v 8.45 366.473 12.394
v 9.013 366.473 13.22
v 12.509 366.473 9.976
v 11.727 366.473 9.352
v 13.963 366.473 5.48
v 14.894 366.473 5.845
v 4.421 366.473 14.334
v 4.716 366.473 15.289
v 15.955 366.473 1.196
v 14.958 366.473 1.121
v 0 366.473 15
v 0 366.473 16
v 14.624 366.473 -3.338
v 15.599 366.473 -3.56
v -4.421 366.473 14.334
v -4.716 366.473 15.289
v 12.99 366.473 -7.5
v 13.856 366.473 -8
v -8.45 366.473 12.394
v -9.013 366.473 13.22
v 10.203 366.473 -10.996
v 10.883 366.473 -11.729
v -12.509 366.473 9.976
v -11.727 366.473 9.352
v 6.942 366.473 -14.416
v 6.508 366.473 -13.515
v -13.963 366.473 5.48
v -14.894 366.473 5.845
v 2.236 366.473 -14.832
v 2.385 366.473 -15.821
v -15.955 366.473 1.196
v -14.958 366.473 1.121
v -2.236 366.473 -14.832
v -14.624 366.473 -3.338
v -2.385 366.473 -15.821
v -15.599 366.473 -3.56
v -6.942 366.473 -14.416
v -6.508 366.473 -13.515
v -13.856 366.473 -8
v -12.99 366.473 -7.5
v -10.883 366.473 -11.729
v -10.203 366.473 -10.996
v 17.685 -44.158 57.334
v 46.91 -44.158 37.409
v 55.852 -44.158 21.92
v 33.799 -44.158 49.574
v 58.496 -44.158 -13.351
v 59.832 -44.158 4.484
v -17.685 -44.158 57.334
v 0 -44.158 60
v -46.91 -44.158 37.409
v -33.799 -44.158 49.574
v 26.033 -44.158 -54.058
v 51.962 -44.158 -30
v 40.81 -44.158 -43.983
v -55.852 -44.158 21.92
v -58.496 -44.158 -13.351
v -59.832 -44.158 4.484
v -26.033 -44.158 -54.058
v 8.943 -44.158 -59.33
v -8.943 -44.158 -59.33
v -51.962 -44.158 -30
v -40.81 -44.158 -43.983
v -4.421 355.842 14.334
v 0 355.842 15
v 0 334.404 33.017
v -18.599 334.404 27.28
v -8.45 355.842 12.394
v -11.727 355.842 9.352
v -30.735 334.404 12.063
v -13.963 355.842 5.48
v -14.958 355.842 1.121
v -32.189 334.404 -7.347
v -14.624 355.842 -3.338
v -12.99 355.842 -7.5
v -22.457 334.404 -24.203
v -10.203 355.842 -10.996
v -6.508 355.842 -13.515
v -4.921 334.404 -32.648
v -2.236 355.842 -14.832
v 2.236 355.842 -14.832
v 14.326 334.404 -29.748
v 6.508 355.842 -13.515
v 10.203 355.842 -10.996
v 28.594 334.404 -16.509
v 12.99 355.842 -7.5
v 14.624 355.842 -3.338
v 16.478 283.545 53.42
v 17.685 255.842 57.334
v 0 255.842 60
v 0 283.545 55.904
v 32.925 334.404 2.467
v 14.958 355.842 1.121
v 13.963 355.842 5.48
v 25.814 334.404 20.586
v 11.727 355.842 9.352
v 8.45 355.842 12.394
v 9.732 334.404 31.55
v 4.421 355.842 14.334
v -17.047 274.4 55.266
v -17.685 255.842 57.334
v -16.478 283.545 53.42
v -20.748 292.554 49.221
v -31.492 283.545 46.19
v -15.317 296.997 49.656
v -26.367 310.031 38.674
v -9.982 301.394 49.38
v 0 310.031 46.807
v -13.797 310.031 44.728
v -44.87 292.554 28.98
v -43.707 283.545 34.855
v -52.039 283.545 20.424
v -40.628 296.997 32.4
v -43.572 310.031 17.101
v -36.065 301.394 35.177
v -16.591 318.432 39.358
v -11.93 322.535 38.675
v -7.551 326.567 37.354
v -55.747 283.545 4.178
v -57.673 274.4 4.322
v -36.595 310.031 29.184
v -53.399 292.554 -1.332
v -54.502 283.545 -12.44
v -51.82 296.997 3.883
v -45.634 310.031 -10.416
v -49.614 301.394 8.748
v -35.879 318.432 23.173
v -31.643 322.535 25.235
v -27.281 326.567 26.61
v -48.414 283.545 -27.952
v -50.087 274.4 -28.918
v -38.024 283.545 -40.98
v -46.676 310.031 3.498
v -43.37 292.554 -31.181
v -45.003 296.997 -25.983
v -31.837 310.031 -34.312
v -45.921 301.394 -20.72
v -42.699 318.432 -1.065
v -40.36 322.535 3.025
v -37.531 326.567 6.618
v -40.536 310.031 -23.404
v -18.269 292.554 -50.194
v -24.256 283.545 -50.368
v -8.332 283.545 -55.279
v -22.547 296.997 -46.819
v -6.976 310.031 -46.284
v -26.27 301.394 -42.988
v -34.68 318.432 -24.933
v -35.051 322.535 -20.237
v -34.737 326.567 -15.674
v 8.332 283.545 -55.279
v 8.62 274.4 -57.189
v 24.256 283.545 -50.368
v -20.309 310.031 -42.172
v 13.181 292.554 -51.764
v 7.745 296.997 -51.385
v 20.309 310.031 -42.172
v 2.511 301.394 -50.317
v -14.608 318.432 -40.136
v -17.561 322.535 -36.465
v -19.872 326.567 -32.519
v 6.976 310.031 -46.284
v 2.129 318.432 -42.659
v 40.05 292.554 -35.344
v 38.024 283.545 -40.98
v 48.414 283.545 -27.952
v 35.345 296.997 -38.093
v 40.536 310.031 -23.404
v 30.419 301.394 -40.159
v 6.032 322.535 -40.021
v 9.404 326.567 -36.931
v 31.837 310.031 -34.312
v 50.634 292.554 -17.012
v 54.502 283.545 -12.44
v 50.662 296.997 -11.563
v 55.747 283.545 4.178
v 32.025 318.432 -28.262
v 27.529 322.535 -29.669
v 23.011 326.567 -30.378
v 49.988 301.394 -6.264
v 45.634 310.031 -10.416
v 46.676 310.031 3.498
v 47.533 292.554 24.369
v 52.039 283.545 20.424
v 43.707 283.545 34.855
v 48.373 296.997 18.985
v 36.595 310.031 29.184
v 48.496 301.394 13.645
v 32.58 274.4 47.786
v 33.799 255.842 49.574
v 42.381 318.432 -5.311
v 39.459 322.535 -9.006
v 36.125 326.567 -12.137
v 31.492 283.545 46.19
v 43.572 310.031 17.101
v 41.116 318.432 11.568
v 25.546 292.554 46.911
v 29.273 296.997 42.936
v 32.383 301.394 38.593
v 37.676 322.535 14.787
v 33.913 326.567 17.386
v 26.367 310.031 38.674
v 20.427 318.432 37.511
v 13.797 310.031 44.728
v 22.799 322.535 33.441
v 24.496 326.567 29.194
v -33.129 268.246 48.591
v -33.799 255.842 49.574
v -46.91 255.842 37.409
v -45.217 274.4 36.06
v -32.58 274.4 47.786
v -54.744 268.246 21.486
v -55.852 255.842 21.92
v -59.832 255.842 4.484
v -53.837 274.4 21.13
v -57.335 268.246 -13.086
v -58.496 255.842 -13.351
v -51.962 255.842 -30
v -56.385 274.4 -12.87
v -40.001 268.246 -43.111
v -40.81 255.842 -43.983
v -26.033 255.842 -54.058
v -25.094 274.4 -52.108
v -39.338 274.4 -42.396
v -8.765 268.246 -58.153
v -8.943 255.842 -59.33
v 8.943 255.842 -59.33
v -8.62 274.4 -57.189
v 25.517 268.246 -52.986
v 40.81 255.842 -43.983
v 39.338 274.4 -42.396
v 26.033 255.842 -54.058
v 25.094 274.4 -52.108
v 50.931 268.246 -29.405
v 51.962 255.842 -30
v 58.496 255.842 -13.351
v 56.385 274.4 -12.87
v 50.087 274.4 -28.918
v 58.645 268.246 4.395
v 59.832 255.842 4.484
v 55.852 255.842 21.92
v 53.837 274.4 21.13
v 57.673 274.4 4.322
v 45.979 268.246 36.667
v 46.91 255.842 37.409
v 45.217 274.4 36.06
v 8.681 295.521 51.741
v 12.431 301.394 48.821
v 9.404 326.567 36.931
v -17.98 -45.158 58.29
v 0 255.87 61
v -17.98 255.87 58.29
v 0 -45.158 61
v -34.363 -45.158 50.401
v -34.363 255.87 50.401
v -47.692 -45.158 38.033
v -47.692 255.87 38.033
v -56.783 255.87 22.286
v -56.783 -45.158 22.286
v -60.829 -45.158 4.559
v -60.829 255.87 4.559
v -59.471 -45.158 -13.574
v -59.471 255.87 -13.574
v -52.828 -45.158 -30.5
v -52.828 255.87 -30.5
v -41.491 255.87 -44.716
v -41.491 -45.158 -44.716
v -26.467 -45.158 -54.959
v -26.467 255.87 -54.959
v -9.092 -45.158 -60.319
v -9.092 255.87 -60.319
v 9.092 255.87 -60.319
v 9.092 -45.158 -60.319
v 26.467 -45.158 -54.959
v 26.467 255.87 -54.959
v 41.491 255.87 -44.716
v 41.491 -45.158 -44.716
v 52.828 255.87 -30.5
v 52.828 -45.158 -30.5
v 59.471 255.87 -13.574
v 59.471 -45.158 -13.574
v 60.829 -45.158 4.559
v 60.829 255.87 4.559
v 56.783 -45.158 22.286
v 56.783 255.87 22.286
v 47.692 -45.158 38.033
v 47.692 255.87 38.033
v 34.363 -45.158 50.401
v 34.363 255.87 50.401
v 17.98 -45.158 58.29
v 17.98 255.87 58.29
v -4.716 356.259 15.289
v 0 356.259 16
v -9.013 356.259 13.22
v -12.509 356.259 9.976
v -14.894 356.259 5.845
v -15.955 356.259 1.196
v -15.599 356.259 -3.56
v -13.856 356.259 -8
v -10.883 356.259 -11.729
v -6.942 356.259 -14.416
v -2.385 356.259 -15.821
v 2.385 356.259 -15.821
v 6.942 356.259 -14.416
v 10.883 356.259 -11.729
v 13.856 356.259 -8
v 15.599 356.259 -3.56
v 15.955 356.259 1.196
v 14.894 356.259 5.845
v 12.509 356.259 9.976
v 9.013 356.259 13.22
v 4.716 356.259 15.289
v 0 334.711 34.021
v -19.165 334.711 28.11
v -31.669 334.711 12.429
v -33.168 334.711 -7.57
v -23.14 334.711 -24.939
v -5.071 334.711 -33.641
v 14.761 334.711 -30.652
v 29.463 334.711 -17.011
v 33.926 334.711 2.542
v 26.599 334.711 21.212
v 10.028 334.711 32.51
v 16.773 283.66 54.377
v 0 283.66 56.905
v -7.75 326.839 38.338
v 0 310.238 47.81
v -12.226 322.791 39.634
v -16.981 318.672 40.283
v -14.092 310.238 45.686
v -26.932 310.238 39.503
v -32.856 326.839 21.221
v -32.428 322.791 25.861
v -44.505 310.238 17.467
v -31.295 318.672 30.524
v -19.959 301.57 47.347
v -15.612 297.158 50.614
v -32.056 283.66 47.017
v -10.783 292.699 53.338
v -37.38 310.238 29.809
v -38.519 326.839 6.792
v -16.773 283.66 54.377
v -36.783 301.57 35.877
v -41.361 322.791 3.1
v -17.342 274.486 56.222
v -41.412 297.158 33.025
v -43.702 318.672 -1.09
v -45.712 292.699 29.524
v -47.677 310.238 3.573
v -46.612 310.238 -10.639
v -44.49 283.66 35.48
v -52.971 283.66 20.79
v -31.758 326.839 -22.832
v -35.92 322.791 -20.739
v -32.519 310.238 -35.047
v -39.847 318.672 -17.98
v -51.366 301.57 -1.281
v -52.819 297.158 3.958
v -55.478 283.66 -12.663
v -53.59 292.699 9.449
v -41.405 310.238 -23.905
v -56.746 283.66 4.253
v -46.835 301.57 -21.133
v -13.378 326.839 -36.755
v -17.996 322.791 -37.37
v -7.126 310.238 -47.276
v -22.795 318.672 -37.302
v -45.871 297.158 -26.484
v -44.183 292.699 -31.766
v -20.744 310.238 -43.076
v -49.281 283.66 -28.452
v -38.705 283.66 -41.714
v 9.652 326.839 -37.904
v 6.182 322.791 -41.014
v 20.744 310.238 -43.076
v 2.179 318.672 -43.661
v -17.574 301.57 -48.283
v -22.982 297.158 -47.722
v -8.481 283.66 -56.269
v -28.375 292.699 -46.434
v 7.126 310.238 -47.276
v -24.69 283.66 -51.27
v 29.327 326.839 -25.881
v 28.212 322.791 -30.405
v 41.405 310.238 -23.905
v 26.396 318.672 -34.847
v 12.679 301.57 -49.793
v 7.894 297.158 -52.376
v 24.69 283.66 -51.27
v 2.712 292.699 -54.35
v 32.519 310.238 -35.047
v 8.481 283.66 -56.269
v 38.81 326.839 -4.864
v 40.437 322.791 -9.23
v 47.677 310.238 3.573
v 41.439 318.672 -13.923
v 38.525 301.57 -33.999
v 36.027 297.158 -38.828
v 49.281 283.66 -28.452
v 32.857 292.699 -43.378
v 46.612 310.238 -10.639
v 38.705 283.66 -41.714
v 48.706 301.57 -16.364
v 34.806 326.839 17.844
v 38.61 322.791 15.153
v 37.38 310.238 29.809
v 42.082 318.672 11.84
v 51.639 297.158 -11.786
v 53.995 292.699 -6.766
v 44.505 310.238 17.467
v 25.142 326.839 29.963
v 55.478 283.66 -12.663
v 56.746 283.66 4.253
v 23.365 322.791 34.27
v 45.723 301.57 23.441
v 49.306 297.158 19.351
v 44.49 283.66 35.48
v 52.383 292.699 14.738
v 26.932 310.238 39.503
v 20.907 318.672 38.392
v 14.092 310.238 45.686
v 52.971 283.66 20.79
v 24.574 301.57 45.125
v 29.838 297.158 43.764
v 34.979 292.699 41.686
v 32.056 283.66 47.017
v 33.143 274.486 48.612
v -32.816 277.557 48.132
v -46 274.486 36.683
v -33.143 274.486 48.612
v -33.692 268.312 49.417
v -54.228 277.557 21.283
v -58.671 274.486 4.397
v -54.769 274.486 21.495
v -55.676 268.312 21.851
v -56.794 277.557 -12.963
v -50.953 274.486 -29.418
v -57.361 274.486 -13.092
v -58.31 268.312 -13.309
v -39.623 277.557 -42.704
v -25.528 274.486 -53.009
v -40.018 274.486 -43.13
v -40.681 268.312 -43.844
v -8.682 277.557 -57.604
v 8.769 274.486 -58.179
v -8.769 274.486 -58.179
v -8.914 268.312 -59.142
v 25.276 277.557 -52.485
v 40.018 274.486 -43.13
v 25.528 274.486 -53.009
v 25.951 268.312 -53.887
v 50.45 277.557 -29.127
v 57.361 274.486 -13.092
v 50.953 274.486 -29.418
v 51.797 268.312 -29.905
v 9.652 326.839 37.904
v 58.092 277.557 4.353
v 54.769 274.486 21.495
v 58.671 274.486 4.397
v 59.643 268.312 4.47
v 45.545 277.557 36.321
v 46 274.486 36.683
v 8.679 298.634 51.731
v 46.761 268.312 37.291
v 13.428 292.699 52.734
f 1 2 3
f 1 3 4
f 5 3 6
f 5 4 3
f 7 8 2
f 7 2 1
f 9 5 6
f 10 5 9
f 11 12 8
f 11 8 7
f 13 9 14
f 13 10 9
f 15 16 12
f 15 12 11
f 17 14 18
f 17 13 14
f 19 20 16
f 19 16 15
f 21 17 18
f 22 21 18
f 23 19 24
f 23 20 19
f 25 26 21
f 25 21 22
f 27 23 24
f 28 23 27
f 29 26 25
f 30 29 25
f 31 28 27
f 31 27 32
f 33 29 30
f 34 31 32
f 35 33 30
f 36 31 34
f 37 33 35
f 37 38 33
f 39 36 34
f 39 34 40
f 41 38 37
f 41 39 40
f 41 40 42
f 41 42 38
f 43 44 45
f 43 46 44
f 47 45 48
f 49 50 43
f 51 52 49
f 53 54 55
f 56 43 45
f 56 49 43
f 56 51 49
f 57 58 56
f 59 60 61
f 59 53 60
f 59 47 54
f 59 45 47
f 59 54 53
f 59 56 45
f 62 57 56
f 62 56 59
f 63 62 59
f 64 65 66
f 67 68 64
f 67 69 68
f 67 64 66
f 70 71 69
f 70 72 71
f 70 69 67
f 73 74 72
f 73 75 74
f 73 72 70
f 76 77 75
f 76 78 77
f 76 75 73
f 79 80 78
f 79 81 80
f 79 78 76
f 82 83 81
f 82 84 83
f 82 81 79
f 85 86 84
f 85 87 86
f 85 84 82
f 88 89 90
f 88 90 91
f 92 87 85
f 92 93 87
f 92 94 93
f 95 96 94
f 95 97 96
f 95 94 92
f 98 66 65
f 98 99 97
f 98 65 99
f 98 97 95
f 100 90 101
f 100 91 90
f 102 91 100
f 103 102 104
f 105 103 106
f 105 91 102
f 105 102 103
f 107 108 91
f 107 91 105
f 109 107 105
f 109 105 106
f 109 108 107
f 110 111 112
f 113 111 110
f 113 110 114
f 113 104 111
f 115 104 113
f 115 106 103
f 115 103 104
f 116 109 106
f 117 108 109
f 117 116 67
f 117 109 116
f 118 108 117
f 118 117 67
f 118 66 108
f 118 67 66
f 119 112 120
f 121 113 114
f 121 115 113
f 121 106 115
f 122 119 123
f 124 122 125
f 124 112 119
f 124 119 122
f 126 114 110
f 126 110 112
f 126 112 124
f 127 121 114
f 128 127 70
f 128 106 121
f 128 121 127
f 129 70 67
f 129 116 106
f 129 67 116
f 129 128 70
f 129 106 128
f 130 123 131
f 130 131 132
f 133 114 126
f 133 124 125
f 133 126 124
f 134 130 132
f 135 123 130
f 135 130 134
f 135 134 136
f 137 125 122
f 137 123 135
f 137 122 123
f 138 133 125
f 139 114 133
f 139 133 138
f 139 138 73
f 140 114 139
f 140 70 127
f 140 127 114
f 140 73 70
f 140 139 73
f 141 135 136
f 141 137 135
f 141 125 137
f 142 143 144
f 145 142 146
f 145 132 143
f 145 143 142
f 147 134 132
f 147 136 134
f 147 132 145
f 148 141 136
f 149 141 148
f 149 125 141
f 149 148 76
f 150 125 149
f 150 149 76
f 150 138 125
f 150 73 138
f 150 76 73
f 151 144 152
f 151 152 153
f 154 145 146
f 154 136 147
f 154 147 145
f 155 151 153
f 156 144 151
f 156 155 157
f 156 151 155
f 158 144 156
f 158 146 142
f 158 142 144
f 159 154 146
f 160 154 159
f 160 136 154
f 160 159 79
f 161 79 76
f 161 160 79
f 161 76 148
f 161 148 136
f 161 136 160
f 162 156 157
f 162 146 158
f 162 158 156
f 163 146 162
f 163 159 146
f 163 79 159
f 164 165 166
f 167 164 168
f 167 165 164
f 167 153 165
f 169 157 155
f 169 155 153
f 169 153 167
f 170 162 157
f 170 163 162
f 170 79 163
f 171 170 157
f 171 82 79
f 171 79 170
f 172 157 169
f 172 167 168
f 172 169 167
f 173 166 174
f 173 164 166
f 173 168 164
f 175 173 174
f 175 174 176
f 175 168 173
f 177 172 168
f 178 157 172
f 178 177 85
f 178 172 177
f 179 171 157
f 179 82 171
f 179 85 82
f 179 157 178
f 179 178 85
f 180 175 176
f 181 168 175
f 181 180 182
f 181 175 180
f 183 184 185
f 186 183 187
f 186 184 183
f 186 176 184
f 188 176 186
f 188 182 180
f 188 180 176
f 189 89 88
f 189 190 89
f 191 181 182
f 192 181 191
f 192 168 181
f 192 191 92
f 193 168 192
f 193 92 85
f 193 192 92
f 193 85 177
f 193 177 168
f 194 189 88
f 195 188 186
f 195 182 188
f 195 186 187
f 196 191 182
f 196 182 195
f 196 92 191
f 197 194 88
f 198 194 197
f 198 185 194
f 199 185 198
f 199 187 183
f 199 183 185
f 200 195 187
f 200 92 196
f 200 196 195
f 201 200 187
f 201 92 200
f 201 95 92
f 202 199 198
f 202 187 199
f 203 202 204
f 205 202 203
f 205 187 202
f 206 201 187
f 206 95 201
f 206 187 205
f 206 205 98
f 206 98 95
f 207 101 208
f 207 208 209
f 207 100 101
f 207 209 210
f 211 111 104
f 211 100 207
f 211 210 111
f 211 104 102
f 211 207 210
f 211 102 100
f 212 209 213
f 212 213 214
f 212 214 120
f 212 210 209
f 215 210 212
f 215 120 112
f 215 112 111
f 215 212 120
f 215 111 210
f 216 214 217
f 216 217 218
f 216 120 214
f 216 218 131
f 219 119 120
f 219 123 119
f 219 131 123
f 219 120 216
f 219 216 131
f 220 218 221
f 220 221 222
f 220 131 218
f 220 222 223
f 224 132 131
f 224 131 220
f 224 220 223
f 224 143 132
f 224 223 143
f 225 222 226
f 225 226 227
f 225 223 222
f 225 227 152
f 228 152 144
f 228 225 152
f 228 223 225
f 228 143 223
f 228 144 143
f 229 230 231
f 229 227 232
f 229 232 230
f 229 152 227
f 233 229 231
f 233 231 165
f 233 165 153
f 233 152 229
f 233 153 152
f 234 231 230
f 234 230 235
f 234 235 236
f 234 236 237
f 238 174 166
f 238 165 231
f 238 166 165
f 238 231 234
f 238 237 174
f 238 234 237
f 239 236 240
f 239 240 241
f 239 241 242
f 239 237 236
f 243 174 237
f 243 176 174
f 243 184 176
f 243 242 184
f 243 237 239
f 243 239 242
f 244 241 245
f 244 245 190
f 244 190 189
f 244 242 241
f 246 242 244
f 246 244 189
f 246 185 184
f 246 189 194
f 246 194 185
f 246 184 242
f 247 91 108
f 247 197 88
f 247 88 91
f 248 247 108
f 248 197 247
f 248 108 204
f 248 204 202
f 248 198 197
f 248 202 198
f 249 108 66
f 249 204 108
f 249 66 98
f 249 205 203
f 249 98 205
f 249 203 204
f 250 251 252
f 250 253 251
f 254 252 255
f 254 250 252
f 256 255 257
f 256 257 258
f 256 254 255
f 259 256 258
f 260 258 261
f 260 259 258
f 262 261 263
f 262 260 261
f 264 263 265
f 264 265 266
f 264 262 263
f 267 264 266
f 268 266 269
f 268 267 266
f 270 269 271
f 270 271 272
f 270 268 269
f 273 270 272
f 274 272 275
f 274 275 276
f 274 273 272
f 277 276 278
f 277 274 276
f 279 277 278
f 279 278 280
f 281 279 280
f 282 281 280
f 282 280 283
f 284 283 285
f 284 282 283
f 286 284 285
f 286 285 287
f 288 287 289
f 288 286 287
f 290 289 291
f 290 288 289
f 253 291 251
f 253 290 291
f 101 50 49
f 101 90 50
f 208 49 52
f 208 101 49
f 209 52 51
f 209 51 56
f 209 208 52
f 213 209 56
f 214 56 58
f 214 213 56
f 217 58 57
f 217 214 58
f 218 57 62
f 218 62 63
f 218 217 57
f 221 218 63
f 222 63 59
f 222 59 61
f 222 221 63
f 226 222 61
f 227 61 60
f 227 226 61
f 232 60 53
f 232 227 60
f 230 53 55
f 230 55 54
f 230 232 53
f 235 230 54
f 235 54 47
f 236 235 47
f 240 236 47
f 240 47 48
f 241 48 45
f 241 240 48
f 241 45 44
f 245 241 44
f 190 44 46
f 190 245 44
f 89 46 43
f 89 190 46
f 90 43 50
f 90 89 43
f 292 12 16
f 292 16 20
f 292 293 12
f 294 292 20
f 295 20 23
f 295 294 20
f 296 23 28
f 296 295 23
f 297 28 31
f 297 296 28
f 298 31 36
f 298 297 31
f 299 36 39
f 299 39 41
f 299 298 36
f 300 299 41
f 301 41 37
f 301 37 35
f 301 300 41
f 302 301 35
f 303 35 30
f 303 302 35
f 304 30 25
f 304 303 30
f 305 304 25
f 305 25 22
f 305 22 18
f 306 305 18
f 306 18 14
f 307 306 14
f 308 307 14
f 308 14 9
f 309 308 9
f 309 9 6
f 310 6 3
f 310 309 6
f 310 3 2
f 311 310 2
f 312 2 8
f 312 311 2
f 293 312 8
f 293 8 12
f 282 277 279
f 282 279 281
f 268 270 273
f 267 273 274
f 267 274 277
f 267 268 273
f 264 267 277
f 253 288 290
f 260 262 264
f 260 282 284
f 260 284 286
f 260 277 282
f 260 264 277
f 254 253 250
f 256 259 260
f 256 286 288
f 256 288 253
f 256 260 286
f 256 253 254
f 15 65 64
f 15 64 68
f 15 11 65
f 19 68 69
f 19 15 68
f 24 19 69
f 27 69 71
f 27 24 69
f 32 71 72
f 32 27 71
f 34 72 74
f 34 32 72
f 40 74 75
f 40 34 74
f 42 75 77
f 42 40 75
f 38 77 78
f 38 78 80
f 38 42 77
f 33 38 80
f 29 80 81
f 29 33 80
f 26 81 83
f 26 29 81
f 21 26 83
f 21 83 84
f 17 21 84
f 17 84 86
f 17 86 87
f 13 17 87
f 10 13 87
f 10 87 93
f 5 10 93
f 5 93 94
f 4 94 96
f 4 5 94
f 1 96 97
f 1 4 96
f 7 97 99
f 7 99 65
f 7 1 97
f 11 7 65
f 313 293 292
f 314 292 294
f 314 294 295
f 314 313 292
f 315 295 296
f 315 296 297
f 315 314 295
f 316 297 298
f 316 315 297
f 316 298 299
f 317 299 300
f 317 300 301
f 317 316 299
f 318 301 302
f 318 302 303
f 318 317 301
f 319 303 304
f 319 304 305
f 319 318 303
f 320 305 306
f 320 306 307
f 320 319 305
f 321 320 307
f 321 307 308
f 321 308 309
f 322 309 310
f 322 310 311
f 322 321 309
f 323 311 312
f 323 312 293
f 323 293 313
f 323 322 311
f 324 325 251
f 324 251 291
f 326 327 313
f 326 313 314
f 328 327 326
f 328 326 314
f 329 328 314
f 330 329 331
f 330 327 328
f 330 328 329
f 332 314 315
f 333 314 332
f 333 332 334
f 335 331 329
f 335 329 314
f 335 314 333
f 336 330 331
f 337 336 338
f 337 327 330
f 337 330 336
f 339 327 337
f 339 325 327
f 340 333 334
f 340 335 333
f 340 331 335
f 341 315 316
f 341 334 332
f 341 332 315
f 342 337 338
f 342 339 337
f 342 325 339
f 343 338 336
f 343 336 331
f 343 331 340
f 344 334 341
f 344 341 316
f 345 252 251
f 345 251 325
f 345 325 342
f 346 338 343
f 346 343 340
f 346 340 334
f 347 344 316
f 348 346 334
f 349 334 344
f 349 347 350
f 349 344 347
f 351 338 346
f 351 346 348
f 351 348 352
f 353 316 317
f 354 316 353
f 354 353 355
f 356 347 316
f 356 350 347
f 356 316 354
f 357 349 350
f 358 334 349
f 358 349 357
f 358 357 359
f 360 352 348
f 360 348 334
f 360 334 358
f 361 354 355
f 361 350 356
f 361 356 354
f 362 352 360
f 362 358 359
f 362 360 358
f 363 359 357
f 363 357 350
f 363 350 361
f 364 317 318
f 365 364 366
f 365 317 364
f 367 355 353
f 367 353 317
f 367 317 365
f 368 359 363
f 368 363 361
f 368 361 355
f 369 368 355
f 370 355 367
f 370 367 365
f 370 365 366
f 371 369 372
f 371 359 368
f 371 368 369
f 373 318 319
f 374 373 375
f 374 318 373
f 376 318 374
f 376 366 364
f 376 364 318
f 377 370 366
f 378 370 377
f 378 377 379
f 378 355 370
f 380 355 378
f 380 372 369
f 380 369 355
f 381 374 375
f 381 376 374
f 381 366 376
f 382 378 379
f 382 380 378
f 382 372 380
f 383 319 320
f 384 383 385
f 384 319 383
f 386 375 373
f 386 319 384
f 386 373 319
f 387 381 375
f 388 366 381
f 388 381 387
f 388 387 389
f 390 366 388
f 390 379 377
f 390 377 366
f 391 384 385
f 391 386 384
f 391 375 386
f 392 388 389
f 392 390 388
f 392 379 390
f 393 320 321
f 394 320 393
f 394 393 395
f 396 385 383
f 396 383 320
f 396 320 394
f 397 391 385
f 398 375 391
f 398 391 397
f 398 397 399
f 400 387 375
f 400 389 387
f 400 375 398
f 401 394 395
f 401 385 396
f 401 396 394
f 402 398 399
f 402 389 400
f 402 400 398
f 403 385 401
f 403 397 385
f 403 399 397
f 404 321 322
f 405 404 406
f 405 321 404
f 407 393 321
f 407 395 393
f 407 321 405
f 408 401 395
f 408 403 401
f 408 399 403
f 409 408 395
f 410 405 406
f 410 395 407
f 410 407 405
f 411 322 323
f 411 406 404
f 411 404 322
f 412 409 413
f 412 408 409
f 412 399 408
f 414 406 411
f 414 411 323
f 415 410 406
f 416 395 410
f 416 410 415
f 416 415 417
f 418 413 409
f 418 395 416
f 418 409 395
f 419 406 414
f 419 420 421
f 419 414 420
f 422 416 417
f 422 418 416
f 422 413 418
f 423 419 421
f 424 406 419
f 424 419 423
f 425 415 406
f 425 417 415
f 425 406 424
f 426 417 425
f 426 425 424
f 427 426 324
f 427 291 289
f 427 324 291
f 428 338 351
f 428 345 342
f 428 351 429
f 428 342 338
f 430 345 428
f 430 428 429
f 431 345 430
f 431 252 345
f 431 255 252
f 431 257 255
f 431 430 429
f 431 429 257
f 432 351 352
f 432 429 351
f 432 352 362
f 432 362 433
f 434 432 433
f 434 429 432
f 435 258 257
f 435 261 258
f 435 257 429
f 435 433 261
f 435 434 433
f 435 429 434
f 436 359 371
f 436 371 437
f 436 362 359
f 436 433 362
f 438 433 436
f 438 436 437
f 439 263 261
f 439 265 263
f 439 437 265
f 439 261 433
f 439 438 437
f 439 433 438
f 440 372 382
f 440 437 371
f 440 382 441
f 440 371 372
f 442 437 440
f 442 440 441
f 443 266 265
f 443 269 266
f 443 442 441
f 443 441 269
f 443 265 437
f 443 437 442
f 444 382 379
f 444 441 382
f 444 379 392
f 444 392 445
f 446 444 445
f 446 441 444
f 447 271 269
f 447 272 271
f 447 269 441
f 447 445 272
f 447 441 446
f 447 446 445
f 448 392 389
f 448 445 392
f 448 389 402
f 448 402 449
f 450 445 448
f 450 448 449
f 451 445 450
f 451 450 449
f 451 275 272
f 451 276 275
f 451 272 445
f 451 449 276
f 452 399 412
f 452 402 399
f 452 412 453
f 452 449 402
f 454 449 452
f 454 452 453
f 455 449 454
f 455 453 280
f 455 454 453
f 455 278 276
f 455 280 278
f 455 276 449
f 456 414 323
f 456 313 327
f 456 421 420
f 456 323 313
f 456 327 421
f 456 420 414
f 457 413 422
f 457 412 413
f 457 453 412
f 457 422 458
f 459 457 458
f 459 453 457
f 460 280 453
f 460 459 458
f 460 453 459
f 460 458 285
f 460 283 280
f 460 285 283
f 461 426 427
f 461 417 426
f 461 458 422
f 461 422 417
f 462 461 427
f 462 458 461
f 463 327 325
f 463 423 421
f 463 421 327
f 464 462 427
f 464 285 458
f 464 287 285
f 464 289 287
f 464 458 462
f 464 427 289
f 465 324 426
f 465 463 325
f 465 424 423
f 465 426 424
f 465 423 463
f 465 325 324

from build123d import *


with BuildPart() as part:
    # Sketch8 → Revolve1 (revolve)
    with BuildSketch(Plane.XY, mode=Mode.PRIVATE) as revolve1_sk:
        with BuildLine():
            Line((0, -44.157655741), (-60, -44.157655741))
            Line((-60, -44.157655741), (-60, 255.842344259))
            ThreePointArc((-60, 255.842344259), (-46.807103103, 310.030540655), (-15, 355.842344259))
            Line((-15, 355.842344259), (-15, 365.473388744))
            Line((-15, 365.473388744), (-15, 366.473388744))
            Line((-15, 366.473388744), (-16, 366.473388744))
            Line((-16, 366.473388744), (-16, 356.258998247))
            ThreePointArc((-16, 356.258998247), (-47.810277996, 310.237725941), (-61, 255.869697429))
            Line((-61, 255.869697429), (-61, -45.157655741))
            Line((-61, -45.157655741), (0, -45.157655741))
            Line((0, -45.157655741), (0, -44.157655741))
        make_face()
    revolve(revolve1_sk.sketch.rotate(Axis((0, 434.739798995, 0), (0, -1, 0)), 270), axis=Axis((0, 434.739798995, 0), (0, -1, 0)))


solid = part.part
